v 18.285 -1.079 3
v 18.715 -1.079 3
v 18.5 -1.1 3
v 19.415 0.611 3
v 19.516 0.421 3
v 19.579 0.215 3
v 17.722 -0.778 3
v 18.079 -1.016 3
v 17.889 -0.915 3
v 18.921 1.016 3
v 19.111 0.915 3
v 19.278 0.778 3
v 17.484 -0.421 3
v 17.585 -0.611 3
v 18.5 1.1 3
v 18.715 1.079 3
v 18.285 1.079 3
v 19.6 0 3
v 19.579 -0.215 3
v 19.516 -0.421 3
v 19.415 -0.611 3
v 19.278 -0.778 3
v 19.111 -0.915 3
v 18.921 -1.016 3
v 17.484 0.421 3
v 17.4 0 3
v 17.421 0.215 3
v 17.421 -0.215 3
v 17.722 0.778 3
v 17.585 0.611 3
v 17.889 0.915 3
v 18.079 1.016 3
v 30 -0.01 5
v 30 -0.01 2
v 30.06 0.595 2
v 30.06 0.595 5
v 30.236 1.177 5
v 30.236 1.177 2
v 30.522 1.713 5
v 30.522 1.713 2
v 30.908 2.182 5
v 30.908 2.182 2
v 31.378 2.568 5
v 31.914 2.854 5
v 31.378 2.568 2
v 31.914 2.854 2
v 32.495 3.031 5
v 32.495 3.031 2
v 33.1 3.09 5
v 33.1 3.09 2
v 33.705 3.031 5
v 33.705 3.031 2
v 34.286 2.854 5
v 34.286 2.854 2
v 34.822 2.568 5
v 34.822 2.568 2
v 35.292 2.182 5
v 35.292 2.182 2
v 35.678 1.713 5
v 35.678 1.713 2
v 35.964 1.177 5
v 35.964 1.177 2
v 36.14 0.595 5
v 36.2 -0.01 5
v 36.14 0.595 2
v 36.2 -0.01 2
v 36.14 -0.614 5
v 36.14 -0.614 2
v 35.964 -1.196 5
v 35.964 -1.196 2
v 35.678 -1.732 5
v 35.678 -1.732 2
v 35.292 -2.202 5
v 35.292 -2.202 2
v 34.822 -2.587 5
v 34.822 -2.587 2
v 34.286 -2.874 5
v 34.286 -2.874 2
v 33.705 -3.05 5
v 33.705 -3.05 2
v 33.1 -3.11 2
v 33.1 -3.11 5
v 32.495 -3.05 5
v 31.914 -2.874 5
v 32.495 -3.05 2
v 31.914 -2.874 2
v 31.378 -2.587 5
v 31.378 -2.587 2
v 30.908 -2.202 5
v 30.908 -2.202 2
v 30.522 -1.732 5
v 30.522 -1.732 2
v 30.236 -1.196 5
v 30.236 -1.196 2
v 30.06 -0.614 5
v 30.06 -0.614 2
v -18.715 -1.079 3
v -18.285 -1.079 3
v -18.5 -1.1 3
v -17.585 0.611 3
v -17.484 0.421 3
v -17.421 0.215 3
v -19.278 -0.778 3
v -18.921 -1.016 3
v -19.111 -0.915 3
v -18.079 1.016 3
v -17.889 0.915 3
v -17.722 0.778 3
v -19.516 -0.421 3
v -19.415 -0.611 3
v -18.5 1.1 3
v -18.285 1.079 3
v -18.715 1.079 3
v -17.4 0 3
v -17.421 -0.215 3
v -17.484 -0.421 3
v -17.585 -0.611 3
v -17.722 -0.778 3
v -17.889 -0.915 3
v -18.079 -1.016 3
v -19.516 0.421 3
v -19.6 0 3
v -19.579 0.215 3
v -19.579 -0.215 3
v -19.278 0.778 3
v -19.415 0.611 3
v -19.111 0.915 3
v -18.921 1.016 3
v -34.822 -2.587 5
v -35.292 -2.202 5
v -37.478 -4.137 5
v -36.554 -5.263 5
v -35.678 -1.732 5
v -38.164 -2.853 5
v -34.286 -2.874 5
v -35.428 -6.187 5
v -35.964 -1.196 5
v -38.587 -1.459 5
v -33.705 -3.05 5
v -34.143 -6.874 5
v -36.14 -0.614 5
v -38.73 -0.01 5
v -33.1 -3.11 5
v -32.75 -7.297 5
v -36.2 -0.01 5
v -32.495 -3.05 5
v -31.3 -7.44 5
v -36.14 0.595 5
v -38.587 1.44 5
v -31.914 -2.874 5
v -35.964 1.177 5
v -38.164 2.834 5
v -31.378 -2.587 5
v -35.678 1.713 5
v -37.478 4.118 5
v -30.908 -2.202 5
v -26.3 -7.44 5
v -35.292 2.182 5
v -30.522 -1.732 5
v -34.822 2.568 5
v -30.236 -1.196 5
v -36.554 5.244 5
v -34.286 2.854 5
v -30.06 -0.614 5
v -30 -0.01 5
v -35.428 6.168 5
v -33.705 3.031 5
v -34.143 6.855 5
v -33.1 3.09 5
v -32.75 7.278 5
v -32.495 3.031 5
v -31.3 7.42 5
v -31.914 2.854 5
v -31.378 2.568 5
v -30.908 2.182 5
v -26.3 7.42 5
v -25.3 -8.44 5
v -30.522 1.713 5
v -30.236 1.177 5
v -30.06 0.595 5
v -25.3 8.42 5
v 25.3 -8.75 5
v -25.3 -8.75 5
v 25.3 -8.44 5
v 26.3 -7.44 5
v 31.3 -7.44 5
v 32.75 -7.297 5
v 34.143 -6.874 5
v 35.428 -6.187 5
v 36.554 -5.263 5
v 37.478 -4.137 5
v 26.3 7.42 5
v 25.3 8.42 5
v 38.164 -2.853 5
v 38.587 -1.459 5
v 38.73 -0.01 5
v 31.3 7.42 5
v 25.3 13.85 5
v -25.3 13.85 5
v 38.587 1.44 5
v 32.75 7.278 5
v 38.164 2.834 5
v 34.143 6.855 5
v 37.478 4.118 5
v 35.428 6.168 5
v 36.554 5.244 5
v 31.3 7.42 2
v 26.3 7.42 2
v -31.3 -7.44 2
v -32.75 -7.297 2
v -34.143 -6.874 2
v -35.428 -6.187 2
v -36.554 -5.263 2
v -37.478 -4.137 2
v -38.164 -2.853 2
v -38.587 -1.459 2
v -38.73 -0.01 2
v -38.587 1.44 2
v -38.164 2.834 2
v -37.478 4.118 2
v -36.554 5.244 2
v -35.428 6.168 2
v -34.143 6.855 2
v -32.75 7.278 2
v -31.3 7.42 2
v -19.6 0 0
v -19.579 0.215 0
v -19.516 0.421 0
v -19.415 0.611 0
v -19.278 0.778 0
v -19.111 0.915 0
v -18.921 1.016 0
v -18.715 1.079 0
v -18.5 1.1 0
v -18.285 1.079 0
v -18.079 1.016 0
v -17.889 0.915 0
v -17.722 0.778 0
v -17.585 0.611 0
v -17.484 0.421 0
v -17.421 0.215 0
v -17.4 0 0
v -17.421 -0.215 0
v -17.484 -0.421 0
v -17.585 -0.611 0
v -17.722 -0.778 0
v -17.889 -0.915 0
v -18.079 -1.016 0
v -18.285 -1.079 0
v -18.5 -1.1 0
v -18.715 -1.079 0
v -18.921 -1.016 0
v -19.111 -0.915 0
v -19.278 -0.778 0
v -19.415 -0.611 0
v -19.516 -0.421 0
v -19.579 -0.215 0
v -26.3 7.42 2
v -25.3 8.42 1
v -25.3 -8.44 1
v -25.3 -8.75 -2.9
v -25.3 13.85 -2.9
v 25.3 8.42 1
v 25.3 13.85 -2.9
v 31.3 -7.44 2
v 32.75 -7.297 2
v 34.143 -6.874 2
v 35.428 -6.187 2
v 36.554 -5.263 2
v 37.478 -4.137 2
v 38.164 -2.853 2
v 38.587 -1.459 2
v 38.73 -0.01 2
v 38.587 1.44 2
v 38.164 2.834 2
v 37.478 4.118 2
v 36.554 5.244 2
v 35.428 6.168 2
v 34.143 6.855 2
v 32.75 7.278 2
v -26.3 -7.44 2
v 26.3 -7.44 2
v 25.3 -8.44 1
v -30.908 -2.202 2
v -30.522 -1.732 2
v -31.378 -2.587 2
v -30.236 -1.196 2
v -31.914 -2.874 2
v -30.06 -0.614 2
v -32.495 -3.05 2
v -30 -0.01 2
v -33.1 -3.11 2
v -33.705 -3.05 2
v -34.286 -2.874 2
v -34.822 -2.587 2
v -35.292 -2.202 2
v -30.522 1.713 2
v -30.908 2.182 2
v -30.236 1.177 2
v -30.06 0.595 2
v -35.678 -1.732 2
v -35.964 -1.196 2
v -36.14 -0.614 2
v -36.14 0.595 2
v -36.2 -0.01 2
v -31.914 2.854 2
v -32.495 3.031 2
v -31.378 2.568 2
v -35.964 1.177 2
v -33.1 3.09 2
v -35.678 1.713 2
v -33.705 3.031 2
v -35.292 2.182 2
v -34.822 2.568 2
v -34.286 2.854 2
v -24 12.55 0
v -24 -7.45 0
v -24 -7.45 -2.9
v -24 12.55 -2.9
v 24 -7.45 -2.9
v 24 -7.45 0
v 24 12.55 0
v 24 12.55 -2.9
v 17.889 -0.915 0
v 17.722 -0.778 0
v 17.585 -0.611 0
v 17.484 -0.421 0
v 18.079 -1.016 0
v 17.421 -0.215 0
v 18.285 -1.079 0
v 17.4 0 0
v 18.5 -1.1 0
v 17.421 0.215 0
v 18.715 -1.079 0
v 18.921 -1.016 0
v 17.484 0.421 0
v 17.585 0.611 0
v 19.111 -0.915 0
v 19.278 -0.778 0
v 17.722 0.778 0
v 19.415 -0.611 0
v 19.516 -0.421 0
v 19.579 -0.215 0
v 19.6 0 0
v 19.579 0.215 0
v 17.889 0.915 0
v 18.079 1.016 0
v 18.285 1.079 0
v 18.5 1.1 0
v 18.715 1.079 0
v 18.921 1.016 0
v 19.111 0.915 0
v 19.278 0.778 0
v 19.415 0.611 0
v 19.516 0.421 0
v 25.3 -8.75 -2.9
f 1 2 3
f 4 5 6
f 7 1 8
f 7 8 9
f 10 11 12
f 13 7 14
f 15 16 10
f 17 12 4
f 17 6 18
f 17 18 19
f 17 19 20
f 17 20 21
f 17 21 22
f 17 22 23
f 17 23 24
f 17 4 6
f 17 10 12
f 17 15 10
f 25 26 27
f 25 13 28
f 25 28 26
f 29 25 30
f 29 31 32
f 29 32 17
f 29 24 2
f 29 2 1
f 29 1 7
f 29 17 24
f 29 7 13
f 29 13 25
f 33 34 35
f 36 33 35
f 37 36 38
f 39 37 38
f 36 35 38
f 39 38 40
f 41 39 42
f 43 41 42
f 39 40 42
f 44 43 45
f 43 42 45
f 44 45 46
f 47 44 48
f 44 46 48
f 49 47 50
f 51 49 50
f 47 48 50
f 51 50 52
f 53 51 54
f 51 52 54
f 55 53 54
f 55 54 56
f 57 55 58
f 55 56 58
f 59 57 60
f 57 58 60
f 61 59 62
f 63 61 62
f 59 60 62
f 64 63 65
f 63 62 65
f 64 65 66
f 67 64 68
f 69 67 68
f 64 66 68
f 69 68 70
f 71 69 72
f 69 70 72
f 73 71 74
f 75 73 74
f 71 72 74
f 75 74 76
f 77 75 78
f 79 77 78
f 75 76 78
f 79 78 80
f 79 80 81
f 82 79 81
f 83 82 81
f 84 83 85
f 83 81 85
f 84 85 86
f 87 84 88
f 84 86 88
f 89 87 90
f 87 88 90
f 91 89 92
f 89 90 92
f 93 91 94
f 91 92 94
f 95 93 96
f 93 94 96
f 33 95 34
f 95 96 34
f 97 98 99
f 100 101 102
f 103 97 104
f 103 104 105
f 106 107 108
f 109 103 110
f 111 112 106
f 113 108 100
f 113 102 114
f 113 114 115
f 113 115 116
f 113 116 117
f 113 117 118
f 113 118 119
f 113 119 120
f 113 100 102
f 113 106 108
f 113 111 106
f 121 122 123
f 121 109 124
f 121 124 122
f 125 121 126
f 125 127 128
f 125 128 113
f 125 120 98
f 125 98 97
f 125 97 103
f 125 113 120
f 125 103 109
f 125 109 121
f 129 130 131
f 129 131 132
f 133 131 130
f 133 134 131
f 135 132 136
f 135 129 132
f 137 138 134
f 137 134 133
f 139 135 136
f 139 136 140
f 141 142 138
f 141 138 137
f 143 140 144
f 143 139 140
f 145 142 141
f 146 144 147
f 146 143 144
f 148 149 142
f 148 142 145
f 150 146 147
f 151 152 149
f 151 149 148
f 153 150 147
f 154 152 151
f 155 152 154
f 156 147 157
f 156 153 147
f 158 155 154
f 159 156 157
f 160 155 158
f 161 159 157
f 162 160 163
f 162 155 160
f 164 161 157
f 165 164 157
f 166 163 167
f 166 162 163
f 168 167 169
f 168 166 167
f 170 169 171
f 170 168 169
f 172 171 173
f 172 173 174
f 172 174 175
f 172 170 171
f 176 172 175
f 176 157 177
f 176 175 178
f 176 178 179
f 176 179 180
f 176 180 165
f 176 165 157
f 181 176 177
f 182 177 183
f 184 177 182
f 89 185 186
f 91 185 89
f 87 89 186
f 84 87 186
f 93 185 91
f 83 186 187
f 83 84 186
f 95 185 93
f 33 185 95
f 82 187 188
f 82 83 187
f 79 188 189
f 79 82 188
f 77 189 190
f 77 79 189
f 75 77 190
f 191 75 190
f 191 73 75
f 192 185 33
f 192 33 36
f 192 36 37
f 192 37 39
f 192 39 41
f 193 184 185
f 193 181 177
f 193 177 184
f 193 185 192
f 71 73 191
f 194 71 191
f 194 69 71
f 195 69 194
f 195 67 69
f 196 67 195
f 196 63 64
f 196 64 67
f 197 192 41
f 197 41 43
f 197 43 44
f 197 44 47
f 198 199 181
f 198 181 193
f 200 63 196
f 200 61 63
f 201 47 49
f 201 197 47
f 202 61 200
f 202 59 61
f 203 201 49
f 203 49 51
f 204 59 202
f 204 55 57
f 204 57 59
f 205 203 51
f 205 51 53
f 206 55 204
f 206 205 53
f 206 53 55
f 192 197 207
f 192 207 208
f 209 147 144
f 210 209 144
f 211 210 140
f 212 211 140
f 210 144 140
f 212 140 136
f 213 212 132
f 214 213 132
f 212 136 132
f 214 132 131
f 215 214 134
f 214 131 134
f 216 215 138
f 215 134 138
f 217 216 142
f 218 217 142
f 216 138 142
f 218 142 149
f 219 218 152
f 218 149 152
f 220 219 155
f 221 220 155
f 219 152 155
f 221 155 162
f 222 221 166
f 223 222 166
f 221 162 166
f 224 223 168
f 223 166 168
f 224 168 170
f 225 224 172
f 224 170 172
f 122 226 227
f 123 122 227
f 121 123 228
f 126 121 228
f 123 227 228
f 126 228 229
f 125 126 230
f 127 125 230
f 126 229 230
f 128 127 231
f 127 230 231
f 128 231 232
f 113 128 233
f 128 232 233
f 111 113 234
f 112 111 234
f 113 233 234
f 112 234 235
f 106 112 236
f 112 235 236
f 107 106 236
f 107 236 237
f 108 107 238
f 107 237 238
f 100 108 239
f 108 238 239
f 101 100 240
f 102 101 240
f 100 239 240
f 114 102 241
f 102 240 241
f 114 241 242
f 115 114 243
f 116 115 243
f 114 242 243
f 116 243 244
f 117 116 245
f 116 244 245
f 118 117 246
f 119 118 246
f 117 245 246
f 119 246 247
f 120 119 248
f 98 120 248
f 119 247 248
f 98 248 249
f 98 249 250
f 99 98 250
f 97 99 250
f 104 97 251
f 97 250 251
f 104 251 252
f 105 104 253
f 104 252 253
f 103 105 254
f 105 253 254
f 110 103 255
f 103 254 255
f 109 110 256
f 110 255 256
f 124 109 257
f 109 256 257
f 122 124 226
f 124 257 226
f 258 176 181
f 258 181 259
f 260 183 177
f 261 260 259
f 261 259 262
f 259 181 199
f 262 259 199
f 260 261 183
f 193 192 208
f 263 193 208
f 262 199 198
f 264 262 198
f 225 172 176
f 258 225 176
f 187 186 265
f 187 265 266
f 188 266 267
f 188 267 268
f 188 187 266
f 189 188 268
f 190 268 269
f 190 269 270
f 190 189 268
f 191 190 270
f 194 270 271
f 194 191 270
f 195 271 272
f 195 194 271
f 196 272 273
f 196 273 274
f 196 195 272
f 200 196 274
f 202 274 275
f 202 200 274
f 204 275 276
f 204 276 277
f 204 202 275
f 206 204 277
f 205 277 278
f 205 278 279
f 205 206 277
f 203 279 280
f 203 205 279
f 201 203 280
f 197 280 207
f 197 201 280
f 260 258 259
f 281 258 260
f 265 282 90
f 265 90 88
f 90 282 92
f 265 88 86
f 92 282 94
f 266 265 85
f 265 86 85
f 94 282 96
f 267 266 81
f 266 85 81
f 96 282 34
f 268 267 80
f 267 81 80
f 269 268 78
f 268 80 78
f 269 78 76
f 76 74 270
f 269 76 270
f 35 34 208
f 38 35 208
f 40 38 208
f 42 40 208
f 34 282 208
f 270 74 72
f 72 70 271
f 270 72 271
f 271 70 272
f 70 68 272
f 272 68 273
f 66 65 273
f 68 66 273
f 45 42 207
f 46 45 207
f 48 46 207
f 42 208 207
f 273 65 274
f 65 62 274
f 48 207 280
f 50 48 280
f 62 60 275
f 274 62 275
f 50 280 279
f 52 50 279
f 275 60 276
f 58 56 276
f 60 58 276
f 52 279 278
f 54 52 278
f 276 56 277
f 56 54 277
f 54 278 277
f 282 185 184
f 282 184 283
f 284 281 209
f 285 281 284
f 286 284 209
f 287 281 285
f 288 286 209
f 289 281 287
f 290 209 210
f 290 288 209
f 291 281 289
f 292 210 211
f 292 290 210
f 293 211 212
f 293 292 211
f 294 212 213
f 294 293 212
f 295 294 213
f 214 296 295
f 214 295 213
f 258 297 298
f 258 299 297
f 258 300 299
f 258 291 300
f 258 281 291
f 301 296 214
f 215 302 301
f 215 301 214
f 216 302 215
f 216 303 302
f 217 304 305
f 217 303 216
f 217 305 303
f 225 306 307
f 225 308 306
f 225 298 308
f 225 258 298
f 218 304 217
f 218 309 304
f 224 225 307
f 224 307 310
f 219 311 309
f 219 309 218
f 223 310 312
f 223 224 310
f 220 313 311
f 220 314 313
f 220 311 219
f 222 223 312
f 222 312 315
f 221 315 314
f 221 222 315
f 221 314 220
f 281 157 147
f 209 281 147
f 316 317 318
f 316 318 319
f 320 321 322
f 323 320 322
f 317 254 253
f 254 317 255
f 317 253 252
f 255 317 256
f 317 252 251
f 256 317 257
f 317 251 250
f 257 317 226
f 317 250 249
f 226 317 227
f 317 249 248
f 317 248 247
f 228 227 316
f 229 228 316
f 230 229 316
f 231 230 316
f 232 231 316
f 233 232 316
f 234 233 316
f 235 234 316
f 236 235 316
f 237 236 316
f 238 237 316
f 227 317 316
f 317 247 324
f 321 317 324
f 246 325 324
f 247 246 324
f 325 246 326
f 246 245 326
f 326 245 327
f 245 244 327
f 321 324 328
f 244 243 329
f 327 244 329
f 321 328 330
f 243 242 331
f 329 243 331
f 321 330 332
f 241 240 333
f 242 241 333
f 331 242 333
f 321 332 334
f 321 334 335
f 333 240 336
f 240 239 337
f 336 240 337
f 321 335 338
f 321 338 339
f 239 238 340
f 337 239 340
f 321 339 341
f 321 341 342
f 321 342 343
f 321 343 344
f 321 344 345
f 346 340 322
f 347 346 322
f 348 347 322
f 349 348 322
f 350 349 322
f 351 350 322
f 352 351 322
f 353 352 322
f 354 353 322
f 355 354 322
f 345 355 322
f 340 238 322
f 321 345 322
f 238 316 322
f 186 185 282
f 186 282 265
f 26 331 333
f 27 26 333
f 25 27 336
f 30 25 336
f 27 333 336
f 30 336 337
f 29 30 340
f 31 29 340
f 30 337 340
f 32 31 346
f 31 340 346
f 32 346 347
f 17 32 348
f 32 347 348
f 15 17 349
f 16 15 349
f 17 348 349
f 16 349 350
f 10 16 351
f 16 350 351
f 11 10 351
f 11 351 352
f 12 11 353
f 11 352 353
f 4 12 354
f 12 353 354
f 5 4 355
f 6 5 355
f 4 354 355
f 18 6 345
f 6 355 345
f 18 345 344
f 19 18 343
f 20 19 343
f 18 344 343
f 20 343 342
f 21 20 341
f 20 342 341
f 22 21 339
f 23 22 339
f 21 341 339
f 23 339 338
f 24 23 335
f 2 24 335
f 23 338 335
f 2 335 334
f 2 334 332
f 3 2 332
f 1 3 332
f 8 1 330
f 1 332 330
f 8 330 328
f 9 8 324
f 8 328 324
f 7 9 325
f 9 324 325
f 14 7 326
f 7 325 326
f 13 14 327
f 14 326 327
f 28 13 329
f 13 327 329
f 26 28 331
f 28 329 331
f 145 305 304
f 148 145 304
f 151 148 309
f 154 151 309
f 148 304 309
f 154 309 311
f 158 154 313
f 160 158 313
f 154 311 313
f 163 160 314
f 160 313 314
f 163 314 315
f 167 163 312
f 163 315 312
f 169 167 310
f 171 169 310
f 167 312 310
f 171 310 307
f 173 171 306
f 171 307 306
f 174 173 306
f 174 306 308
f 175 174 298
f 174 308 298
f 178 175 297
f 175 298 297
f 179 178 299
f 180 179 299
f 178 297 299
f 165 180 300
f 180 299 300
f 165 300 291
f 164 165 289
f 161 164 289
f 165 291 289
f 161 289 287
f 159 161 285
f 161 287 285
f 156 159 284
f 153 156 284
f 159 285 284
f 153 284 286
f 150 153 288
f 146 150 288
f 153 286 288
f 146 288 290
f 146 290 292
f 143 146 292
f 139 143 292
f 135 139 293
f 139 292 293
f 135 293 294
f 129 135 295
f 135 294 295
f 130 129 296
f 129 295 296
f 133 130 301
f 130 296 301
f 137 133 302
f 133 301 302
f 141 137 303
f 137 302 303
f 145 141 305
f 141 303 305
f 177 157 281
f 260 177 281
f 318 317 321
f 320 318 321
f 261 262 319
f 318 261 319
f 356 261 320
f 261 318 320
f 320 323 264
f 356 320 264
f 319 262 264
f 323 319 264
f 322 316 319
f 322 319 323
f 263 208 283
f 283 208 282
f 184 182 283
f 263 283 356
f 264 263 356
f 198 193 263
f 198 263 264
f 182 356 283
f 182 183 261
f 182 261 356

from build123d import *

# Parameters (mm, degrees)
BOSS_EXTRUDE1_DEPTH = 5
SKETCH2_W           = 50.6
SKETCH2_H           = 22.6
SKETCH2_W_2         = 48
SKETCH2_H_2         = 20
BOSS_EXTRUDE2_DEPTH = 7.9
SKETCH3_R           = 1.1
CUT_EXTRUDE1_DEPTH  = 3
BOSS_EXTRUDE3_DEPTH = 3
CHAMFER1_SIZE       = 1
SKETCH5_R           = 3.1
CUT_EXTRUDE2_DEPTH  = 3


with BuildPart() as part:
    # Sketch1 → Boss-Extrude1 (new body)
    with BuildSketch(Plane.XY):
        Polygon((24, 12.55), (6.08, 12.55), (-6.08, 12.55), (-24, 12.55), (-24, -7.45), (24, -7.45), align=None)
    extrude(amount=BOSS_EXTRUDE1_DEPTH)

    # Sketch2 → Boss-Extrude2 (add)
    with BuildSketch(Plane.XY.offset(5)):
        with Locations((0, 2.55)):
            Rectangle(SKETCH2_W, SKETCH2_H)
        with Locations((0, 2.55)):
            Rectangle(SKETCH2_W_2, SKETCH2_H_2, mode=Mode.SUBTRACT)
    extrude(amount=-BOSS_EXTRUDE2_DEPTH)

    # Sketch3 → Cut-Extrude1 (cut)
    with BuildSketch(Plane(origin=(0, 0, 0), x_dir=(-1, 0, 0), z_dir=(0, 0, -1))):
        with Locations((-18.5, 0)):
            Circle(SKETCH3_R)
        with Locations((18.5, 0)):
            Circle(SKETCH3_R)
    extrude(amount=-CUT_EXTRUDE1_DEPTH, mode=Mode.SUBTRACT)

    # Sketch4 → Boss-Extrude3 (add)
    with BuildSketch(Plane.XY.offset(5)):
        with BuildLine():
            Line((25.3, -7.439559179), (31.3, -7.439559179))
            ThreePointArc((31.3, -7.439559179), (38.729997149, -0.00956203), (31.3, 7.42043512))
            Line((31.3, 7.42043512), (25.3, 7.42043512))
            Line((25.3, 7.42043512), (25.3, -7.439559179))
        make_face()
        with BuildLine():
            Line((-25.3, -7.439559179), (-31.3, -7.439559179))
            ThreePointArc((-31.3, -7.439559179), (-38.729997149, -0.00956203), (-31.3, 7.42043512))
            Line((-31.3, 7.42043512), (-25.3, 7.42043512))
            Line((-25.3, 7.42043512), (-25.3, -7.439559179))
        make_face()
    extrude(amount=-BOSS_EXTRUDE3_DEPTH)

    # Chamfer1
    chamfer1_edges = [part.edges().sort_by_distance(p)[0] for p in [
        (25.3, -0.00956203, 2),
        (25.3, -7.439559179, 3.5),
        (25.3, 7.42043512, 3.5),
        (-25.3, -0.00956203, 2),
        (-25.3, 7.42043512, 3.5),
        (-25.3, -7.439559179, 3.5),
    ]]
    chamfer(chamfer1_edges, length=CHAMFER1_SIZE)

    # Sketch5 → Cut-Extrude2 (cut)
    with BuildSketch(Plane(origin=(0, 0, 2), x_dir=(-1, 0, 0), z_dir=(0, 0, -1))):
        with Locations((-33.1, -0.00956203)):
            Circle(SKETCH5_R)
        with Locations((33.1, -0.00956203)):
            Circle(SKETCH5_R)
    extrude(amount=-CUT_EXTRUDE2_DEPTH, mode=Mode.SUBTRACT)


solid = part.part
